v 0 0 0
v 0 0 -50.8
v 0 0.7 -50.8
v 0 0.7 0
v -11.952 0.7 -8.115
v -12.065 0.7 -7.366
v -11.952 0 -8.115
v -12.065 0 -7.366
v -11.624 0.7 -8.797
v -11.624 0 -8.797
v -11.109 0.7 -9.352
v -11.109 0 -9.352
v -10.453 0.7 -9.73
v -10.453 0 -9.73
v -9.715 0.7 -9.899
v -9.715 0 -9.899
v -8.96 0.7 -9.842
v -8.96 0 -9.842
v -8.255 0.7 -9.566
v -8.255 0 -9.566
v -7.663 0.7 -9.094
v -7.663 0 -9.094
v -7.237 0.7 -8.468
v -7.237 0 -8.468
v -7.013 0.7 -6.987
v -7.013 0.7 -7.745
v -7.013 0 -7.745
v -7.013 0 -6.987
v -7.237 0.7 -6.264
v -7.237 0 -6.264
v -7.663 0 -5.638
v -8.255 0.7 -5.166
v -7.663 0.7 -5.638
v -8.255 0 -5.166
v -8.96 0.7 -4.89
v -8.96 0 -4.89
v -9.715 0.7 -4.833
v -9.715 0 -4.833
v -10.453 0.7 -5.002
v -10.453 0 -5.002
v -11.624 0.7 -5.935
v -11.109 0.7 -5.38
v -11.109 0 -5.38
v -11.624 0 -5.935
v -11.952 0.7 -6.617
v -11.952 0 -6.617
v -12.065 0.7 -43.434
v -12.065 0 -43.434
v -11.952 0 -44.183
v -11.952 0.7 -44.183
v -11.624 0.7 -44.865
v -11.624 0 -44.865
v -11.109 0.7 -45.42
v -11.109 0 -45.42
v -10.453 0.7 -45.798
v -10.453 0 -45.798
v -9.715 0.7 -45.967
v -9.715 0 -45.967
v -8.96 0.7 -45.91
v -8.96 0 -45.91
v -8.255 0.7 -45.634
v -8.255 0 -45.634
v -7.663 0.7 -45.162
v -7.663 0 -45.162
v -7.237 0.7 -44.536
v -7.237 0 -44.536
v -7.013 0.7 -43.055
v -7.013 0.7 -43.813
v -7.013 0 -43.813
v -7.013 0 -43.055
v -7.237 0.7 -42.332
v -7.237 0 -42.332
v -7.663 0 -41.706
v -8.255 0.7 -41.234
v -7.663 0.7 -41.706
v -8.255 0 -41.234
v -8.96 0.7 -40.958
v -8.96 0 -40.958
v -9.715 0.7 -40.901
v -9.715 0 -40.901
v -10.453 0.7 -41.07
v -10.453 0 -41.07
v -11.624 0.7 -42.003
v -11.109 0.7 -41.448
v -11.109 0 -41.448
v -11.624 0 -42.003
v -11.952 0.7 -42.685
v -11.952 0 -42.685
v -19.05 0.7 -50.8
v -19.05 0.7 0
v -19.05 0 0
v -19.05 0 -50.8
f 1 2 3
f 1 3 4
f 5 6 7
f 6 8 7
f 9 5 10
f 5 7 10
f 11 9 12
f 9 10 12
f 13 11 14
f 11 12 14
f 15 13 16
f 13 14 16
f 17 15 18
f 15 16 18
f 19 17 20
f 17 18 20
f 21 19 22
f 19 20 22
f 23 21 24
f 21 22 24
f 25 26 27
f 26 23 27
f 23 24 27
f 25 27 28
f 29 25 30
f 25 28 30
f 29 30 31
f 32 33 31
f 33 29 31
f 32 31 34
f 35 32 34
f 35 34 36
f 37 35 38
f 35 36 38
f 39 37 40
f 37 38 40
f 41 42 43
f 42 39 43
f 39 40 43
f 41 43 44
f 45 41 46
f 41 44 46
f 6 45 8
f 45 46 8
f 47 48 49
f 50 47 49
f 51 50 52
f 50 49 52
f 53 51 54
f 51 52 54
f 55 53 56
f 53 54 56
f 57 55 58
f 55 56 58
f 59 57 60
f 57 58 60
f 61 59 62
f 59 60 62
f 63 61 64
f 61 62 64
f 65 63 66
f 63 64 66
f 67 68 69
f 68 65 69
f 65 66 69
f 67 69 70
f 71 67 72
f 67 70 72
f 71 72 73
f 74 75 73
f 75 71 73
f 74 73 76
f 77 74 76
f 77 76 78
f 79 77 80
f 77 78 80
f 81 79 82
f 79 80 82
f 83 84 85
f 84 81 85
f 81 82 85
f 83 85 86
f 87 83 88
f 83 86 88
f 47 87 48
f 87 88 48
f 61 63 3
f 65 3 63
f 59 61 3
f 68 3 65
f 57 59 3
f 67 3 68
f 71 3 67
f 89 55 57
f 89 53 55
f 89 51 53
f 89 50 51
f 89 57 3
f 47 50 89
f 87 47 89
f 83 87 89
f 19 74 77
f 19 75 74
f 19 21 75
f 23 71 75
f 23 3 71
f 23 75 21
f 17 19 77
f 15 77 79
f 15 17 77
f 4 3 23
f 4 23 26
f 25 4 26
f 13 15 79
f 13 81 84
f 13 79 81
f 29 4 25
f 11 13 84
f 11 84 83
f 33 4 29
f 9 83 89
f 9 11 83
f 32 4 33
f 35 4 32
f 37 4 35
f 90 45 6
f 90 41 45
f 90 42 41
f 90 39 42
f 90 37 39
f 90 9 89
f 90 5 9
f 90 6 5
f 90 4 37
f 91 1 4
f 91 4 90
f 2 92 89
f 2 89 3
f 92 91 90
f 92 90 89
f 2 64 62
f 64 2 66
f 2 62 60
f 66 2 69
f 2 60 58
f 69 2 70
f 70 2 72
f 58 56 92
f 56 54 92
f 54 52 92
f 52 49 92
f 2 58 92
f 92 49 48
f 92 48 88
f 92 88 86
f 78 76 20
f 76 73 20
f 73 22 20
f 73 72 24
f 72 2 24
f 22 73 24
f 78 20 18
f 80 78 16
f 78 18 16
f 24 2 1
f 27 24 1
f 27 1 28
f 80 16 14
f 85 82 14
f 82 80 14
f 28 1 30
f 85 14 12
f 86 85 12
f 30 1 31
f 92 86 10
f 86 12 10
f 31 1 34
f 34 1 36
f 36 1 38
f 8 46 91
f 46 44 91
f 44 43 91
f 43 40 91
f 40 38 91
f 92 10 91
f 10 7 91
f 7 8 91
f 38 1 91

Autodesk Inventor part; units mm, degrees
ref_plane "YZ Plane" through (0, 0, 0) normal (1, 0, 0) x (0, 1, 0)
ref_plane "XZ Plane" through (0, 0, 0) normal (0, 1, 0) x (-1, 0, 0)
ref_plane "XY Plane" through (0, 0, 0) normal (0, 0, 1) x (1, 0, 0)
sketch "Sketch1" plane through (0, 0, 0) normal (0, 1, 0) x (-1, 0, 0)
  line L0 (0, 0) -> (19.05, 0)
  line L1 (19.05, 0) -> (19.05, -50.8)
  line L2 (19.05, -50.8) -> (0, -50.8)
  line L3 (0, -50.8) -> (0, 0)
  line L4 (19.05, 0) -> (0, 0)
  line L5 (0, 0) -> (0, -14.732)
  line L6 (0, -14.732) -> (19.05, -14.732)
  line L7 (19.05, -14.732) -> (19.05, 0)
  line L8 (19.05, -50.8) -> (0, -50.8)
  line L9 (0, -50.8) -> (0, -36.068)
  line L10 (0, -36.068) -> (19.05, -36.068)
  line L11 (19.05, -36.068) -> (19.05, -50.8)
  circle A0 centre (9.525, -7.366) radius 2.54
  circle A1 centre (9.525, -43.434) radius 2.54
  dimension "d0" = 50.8
  dimension "d1" = 19.05
  dimension "d2" = 14.732
  dimension "d3" = 14.732
  dimension "d4" = 5.08
  dimension "d5" = 5.08
extrude "Extrusion1" add sketch "Sketch1" along normal blind 0.7
equation "\"d3\" = d2"
properties part number "Part18.iptMotorProtector2"
